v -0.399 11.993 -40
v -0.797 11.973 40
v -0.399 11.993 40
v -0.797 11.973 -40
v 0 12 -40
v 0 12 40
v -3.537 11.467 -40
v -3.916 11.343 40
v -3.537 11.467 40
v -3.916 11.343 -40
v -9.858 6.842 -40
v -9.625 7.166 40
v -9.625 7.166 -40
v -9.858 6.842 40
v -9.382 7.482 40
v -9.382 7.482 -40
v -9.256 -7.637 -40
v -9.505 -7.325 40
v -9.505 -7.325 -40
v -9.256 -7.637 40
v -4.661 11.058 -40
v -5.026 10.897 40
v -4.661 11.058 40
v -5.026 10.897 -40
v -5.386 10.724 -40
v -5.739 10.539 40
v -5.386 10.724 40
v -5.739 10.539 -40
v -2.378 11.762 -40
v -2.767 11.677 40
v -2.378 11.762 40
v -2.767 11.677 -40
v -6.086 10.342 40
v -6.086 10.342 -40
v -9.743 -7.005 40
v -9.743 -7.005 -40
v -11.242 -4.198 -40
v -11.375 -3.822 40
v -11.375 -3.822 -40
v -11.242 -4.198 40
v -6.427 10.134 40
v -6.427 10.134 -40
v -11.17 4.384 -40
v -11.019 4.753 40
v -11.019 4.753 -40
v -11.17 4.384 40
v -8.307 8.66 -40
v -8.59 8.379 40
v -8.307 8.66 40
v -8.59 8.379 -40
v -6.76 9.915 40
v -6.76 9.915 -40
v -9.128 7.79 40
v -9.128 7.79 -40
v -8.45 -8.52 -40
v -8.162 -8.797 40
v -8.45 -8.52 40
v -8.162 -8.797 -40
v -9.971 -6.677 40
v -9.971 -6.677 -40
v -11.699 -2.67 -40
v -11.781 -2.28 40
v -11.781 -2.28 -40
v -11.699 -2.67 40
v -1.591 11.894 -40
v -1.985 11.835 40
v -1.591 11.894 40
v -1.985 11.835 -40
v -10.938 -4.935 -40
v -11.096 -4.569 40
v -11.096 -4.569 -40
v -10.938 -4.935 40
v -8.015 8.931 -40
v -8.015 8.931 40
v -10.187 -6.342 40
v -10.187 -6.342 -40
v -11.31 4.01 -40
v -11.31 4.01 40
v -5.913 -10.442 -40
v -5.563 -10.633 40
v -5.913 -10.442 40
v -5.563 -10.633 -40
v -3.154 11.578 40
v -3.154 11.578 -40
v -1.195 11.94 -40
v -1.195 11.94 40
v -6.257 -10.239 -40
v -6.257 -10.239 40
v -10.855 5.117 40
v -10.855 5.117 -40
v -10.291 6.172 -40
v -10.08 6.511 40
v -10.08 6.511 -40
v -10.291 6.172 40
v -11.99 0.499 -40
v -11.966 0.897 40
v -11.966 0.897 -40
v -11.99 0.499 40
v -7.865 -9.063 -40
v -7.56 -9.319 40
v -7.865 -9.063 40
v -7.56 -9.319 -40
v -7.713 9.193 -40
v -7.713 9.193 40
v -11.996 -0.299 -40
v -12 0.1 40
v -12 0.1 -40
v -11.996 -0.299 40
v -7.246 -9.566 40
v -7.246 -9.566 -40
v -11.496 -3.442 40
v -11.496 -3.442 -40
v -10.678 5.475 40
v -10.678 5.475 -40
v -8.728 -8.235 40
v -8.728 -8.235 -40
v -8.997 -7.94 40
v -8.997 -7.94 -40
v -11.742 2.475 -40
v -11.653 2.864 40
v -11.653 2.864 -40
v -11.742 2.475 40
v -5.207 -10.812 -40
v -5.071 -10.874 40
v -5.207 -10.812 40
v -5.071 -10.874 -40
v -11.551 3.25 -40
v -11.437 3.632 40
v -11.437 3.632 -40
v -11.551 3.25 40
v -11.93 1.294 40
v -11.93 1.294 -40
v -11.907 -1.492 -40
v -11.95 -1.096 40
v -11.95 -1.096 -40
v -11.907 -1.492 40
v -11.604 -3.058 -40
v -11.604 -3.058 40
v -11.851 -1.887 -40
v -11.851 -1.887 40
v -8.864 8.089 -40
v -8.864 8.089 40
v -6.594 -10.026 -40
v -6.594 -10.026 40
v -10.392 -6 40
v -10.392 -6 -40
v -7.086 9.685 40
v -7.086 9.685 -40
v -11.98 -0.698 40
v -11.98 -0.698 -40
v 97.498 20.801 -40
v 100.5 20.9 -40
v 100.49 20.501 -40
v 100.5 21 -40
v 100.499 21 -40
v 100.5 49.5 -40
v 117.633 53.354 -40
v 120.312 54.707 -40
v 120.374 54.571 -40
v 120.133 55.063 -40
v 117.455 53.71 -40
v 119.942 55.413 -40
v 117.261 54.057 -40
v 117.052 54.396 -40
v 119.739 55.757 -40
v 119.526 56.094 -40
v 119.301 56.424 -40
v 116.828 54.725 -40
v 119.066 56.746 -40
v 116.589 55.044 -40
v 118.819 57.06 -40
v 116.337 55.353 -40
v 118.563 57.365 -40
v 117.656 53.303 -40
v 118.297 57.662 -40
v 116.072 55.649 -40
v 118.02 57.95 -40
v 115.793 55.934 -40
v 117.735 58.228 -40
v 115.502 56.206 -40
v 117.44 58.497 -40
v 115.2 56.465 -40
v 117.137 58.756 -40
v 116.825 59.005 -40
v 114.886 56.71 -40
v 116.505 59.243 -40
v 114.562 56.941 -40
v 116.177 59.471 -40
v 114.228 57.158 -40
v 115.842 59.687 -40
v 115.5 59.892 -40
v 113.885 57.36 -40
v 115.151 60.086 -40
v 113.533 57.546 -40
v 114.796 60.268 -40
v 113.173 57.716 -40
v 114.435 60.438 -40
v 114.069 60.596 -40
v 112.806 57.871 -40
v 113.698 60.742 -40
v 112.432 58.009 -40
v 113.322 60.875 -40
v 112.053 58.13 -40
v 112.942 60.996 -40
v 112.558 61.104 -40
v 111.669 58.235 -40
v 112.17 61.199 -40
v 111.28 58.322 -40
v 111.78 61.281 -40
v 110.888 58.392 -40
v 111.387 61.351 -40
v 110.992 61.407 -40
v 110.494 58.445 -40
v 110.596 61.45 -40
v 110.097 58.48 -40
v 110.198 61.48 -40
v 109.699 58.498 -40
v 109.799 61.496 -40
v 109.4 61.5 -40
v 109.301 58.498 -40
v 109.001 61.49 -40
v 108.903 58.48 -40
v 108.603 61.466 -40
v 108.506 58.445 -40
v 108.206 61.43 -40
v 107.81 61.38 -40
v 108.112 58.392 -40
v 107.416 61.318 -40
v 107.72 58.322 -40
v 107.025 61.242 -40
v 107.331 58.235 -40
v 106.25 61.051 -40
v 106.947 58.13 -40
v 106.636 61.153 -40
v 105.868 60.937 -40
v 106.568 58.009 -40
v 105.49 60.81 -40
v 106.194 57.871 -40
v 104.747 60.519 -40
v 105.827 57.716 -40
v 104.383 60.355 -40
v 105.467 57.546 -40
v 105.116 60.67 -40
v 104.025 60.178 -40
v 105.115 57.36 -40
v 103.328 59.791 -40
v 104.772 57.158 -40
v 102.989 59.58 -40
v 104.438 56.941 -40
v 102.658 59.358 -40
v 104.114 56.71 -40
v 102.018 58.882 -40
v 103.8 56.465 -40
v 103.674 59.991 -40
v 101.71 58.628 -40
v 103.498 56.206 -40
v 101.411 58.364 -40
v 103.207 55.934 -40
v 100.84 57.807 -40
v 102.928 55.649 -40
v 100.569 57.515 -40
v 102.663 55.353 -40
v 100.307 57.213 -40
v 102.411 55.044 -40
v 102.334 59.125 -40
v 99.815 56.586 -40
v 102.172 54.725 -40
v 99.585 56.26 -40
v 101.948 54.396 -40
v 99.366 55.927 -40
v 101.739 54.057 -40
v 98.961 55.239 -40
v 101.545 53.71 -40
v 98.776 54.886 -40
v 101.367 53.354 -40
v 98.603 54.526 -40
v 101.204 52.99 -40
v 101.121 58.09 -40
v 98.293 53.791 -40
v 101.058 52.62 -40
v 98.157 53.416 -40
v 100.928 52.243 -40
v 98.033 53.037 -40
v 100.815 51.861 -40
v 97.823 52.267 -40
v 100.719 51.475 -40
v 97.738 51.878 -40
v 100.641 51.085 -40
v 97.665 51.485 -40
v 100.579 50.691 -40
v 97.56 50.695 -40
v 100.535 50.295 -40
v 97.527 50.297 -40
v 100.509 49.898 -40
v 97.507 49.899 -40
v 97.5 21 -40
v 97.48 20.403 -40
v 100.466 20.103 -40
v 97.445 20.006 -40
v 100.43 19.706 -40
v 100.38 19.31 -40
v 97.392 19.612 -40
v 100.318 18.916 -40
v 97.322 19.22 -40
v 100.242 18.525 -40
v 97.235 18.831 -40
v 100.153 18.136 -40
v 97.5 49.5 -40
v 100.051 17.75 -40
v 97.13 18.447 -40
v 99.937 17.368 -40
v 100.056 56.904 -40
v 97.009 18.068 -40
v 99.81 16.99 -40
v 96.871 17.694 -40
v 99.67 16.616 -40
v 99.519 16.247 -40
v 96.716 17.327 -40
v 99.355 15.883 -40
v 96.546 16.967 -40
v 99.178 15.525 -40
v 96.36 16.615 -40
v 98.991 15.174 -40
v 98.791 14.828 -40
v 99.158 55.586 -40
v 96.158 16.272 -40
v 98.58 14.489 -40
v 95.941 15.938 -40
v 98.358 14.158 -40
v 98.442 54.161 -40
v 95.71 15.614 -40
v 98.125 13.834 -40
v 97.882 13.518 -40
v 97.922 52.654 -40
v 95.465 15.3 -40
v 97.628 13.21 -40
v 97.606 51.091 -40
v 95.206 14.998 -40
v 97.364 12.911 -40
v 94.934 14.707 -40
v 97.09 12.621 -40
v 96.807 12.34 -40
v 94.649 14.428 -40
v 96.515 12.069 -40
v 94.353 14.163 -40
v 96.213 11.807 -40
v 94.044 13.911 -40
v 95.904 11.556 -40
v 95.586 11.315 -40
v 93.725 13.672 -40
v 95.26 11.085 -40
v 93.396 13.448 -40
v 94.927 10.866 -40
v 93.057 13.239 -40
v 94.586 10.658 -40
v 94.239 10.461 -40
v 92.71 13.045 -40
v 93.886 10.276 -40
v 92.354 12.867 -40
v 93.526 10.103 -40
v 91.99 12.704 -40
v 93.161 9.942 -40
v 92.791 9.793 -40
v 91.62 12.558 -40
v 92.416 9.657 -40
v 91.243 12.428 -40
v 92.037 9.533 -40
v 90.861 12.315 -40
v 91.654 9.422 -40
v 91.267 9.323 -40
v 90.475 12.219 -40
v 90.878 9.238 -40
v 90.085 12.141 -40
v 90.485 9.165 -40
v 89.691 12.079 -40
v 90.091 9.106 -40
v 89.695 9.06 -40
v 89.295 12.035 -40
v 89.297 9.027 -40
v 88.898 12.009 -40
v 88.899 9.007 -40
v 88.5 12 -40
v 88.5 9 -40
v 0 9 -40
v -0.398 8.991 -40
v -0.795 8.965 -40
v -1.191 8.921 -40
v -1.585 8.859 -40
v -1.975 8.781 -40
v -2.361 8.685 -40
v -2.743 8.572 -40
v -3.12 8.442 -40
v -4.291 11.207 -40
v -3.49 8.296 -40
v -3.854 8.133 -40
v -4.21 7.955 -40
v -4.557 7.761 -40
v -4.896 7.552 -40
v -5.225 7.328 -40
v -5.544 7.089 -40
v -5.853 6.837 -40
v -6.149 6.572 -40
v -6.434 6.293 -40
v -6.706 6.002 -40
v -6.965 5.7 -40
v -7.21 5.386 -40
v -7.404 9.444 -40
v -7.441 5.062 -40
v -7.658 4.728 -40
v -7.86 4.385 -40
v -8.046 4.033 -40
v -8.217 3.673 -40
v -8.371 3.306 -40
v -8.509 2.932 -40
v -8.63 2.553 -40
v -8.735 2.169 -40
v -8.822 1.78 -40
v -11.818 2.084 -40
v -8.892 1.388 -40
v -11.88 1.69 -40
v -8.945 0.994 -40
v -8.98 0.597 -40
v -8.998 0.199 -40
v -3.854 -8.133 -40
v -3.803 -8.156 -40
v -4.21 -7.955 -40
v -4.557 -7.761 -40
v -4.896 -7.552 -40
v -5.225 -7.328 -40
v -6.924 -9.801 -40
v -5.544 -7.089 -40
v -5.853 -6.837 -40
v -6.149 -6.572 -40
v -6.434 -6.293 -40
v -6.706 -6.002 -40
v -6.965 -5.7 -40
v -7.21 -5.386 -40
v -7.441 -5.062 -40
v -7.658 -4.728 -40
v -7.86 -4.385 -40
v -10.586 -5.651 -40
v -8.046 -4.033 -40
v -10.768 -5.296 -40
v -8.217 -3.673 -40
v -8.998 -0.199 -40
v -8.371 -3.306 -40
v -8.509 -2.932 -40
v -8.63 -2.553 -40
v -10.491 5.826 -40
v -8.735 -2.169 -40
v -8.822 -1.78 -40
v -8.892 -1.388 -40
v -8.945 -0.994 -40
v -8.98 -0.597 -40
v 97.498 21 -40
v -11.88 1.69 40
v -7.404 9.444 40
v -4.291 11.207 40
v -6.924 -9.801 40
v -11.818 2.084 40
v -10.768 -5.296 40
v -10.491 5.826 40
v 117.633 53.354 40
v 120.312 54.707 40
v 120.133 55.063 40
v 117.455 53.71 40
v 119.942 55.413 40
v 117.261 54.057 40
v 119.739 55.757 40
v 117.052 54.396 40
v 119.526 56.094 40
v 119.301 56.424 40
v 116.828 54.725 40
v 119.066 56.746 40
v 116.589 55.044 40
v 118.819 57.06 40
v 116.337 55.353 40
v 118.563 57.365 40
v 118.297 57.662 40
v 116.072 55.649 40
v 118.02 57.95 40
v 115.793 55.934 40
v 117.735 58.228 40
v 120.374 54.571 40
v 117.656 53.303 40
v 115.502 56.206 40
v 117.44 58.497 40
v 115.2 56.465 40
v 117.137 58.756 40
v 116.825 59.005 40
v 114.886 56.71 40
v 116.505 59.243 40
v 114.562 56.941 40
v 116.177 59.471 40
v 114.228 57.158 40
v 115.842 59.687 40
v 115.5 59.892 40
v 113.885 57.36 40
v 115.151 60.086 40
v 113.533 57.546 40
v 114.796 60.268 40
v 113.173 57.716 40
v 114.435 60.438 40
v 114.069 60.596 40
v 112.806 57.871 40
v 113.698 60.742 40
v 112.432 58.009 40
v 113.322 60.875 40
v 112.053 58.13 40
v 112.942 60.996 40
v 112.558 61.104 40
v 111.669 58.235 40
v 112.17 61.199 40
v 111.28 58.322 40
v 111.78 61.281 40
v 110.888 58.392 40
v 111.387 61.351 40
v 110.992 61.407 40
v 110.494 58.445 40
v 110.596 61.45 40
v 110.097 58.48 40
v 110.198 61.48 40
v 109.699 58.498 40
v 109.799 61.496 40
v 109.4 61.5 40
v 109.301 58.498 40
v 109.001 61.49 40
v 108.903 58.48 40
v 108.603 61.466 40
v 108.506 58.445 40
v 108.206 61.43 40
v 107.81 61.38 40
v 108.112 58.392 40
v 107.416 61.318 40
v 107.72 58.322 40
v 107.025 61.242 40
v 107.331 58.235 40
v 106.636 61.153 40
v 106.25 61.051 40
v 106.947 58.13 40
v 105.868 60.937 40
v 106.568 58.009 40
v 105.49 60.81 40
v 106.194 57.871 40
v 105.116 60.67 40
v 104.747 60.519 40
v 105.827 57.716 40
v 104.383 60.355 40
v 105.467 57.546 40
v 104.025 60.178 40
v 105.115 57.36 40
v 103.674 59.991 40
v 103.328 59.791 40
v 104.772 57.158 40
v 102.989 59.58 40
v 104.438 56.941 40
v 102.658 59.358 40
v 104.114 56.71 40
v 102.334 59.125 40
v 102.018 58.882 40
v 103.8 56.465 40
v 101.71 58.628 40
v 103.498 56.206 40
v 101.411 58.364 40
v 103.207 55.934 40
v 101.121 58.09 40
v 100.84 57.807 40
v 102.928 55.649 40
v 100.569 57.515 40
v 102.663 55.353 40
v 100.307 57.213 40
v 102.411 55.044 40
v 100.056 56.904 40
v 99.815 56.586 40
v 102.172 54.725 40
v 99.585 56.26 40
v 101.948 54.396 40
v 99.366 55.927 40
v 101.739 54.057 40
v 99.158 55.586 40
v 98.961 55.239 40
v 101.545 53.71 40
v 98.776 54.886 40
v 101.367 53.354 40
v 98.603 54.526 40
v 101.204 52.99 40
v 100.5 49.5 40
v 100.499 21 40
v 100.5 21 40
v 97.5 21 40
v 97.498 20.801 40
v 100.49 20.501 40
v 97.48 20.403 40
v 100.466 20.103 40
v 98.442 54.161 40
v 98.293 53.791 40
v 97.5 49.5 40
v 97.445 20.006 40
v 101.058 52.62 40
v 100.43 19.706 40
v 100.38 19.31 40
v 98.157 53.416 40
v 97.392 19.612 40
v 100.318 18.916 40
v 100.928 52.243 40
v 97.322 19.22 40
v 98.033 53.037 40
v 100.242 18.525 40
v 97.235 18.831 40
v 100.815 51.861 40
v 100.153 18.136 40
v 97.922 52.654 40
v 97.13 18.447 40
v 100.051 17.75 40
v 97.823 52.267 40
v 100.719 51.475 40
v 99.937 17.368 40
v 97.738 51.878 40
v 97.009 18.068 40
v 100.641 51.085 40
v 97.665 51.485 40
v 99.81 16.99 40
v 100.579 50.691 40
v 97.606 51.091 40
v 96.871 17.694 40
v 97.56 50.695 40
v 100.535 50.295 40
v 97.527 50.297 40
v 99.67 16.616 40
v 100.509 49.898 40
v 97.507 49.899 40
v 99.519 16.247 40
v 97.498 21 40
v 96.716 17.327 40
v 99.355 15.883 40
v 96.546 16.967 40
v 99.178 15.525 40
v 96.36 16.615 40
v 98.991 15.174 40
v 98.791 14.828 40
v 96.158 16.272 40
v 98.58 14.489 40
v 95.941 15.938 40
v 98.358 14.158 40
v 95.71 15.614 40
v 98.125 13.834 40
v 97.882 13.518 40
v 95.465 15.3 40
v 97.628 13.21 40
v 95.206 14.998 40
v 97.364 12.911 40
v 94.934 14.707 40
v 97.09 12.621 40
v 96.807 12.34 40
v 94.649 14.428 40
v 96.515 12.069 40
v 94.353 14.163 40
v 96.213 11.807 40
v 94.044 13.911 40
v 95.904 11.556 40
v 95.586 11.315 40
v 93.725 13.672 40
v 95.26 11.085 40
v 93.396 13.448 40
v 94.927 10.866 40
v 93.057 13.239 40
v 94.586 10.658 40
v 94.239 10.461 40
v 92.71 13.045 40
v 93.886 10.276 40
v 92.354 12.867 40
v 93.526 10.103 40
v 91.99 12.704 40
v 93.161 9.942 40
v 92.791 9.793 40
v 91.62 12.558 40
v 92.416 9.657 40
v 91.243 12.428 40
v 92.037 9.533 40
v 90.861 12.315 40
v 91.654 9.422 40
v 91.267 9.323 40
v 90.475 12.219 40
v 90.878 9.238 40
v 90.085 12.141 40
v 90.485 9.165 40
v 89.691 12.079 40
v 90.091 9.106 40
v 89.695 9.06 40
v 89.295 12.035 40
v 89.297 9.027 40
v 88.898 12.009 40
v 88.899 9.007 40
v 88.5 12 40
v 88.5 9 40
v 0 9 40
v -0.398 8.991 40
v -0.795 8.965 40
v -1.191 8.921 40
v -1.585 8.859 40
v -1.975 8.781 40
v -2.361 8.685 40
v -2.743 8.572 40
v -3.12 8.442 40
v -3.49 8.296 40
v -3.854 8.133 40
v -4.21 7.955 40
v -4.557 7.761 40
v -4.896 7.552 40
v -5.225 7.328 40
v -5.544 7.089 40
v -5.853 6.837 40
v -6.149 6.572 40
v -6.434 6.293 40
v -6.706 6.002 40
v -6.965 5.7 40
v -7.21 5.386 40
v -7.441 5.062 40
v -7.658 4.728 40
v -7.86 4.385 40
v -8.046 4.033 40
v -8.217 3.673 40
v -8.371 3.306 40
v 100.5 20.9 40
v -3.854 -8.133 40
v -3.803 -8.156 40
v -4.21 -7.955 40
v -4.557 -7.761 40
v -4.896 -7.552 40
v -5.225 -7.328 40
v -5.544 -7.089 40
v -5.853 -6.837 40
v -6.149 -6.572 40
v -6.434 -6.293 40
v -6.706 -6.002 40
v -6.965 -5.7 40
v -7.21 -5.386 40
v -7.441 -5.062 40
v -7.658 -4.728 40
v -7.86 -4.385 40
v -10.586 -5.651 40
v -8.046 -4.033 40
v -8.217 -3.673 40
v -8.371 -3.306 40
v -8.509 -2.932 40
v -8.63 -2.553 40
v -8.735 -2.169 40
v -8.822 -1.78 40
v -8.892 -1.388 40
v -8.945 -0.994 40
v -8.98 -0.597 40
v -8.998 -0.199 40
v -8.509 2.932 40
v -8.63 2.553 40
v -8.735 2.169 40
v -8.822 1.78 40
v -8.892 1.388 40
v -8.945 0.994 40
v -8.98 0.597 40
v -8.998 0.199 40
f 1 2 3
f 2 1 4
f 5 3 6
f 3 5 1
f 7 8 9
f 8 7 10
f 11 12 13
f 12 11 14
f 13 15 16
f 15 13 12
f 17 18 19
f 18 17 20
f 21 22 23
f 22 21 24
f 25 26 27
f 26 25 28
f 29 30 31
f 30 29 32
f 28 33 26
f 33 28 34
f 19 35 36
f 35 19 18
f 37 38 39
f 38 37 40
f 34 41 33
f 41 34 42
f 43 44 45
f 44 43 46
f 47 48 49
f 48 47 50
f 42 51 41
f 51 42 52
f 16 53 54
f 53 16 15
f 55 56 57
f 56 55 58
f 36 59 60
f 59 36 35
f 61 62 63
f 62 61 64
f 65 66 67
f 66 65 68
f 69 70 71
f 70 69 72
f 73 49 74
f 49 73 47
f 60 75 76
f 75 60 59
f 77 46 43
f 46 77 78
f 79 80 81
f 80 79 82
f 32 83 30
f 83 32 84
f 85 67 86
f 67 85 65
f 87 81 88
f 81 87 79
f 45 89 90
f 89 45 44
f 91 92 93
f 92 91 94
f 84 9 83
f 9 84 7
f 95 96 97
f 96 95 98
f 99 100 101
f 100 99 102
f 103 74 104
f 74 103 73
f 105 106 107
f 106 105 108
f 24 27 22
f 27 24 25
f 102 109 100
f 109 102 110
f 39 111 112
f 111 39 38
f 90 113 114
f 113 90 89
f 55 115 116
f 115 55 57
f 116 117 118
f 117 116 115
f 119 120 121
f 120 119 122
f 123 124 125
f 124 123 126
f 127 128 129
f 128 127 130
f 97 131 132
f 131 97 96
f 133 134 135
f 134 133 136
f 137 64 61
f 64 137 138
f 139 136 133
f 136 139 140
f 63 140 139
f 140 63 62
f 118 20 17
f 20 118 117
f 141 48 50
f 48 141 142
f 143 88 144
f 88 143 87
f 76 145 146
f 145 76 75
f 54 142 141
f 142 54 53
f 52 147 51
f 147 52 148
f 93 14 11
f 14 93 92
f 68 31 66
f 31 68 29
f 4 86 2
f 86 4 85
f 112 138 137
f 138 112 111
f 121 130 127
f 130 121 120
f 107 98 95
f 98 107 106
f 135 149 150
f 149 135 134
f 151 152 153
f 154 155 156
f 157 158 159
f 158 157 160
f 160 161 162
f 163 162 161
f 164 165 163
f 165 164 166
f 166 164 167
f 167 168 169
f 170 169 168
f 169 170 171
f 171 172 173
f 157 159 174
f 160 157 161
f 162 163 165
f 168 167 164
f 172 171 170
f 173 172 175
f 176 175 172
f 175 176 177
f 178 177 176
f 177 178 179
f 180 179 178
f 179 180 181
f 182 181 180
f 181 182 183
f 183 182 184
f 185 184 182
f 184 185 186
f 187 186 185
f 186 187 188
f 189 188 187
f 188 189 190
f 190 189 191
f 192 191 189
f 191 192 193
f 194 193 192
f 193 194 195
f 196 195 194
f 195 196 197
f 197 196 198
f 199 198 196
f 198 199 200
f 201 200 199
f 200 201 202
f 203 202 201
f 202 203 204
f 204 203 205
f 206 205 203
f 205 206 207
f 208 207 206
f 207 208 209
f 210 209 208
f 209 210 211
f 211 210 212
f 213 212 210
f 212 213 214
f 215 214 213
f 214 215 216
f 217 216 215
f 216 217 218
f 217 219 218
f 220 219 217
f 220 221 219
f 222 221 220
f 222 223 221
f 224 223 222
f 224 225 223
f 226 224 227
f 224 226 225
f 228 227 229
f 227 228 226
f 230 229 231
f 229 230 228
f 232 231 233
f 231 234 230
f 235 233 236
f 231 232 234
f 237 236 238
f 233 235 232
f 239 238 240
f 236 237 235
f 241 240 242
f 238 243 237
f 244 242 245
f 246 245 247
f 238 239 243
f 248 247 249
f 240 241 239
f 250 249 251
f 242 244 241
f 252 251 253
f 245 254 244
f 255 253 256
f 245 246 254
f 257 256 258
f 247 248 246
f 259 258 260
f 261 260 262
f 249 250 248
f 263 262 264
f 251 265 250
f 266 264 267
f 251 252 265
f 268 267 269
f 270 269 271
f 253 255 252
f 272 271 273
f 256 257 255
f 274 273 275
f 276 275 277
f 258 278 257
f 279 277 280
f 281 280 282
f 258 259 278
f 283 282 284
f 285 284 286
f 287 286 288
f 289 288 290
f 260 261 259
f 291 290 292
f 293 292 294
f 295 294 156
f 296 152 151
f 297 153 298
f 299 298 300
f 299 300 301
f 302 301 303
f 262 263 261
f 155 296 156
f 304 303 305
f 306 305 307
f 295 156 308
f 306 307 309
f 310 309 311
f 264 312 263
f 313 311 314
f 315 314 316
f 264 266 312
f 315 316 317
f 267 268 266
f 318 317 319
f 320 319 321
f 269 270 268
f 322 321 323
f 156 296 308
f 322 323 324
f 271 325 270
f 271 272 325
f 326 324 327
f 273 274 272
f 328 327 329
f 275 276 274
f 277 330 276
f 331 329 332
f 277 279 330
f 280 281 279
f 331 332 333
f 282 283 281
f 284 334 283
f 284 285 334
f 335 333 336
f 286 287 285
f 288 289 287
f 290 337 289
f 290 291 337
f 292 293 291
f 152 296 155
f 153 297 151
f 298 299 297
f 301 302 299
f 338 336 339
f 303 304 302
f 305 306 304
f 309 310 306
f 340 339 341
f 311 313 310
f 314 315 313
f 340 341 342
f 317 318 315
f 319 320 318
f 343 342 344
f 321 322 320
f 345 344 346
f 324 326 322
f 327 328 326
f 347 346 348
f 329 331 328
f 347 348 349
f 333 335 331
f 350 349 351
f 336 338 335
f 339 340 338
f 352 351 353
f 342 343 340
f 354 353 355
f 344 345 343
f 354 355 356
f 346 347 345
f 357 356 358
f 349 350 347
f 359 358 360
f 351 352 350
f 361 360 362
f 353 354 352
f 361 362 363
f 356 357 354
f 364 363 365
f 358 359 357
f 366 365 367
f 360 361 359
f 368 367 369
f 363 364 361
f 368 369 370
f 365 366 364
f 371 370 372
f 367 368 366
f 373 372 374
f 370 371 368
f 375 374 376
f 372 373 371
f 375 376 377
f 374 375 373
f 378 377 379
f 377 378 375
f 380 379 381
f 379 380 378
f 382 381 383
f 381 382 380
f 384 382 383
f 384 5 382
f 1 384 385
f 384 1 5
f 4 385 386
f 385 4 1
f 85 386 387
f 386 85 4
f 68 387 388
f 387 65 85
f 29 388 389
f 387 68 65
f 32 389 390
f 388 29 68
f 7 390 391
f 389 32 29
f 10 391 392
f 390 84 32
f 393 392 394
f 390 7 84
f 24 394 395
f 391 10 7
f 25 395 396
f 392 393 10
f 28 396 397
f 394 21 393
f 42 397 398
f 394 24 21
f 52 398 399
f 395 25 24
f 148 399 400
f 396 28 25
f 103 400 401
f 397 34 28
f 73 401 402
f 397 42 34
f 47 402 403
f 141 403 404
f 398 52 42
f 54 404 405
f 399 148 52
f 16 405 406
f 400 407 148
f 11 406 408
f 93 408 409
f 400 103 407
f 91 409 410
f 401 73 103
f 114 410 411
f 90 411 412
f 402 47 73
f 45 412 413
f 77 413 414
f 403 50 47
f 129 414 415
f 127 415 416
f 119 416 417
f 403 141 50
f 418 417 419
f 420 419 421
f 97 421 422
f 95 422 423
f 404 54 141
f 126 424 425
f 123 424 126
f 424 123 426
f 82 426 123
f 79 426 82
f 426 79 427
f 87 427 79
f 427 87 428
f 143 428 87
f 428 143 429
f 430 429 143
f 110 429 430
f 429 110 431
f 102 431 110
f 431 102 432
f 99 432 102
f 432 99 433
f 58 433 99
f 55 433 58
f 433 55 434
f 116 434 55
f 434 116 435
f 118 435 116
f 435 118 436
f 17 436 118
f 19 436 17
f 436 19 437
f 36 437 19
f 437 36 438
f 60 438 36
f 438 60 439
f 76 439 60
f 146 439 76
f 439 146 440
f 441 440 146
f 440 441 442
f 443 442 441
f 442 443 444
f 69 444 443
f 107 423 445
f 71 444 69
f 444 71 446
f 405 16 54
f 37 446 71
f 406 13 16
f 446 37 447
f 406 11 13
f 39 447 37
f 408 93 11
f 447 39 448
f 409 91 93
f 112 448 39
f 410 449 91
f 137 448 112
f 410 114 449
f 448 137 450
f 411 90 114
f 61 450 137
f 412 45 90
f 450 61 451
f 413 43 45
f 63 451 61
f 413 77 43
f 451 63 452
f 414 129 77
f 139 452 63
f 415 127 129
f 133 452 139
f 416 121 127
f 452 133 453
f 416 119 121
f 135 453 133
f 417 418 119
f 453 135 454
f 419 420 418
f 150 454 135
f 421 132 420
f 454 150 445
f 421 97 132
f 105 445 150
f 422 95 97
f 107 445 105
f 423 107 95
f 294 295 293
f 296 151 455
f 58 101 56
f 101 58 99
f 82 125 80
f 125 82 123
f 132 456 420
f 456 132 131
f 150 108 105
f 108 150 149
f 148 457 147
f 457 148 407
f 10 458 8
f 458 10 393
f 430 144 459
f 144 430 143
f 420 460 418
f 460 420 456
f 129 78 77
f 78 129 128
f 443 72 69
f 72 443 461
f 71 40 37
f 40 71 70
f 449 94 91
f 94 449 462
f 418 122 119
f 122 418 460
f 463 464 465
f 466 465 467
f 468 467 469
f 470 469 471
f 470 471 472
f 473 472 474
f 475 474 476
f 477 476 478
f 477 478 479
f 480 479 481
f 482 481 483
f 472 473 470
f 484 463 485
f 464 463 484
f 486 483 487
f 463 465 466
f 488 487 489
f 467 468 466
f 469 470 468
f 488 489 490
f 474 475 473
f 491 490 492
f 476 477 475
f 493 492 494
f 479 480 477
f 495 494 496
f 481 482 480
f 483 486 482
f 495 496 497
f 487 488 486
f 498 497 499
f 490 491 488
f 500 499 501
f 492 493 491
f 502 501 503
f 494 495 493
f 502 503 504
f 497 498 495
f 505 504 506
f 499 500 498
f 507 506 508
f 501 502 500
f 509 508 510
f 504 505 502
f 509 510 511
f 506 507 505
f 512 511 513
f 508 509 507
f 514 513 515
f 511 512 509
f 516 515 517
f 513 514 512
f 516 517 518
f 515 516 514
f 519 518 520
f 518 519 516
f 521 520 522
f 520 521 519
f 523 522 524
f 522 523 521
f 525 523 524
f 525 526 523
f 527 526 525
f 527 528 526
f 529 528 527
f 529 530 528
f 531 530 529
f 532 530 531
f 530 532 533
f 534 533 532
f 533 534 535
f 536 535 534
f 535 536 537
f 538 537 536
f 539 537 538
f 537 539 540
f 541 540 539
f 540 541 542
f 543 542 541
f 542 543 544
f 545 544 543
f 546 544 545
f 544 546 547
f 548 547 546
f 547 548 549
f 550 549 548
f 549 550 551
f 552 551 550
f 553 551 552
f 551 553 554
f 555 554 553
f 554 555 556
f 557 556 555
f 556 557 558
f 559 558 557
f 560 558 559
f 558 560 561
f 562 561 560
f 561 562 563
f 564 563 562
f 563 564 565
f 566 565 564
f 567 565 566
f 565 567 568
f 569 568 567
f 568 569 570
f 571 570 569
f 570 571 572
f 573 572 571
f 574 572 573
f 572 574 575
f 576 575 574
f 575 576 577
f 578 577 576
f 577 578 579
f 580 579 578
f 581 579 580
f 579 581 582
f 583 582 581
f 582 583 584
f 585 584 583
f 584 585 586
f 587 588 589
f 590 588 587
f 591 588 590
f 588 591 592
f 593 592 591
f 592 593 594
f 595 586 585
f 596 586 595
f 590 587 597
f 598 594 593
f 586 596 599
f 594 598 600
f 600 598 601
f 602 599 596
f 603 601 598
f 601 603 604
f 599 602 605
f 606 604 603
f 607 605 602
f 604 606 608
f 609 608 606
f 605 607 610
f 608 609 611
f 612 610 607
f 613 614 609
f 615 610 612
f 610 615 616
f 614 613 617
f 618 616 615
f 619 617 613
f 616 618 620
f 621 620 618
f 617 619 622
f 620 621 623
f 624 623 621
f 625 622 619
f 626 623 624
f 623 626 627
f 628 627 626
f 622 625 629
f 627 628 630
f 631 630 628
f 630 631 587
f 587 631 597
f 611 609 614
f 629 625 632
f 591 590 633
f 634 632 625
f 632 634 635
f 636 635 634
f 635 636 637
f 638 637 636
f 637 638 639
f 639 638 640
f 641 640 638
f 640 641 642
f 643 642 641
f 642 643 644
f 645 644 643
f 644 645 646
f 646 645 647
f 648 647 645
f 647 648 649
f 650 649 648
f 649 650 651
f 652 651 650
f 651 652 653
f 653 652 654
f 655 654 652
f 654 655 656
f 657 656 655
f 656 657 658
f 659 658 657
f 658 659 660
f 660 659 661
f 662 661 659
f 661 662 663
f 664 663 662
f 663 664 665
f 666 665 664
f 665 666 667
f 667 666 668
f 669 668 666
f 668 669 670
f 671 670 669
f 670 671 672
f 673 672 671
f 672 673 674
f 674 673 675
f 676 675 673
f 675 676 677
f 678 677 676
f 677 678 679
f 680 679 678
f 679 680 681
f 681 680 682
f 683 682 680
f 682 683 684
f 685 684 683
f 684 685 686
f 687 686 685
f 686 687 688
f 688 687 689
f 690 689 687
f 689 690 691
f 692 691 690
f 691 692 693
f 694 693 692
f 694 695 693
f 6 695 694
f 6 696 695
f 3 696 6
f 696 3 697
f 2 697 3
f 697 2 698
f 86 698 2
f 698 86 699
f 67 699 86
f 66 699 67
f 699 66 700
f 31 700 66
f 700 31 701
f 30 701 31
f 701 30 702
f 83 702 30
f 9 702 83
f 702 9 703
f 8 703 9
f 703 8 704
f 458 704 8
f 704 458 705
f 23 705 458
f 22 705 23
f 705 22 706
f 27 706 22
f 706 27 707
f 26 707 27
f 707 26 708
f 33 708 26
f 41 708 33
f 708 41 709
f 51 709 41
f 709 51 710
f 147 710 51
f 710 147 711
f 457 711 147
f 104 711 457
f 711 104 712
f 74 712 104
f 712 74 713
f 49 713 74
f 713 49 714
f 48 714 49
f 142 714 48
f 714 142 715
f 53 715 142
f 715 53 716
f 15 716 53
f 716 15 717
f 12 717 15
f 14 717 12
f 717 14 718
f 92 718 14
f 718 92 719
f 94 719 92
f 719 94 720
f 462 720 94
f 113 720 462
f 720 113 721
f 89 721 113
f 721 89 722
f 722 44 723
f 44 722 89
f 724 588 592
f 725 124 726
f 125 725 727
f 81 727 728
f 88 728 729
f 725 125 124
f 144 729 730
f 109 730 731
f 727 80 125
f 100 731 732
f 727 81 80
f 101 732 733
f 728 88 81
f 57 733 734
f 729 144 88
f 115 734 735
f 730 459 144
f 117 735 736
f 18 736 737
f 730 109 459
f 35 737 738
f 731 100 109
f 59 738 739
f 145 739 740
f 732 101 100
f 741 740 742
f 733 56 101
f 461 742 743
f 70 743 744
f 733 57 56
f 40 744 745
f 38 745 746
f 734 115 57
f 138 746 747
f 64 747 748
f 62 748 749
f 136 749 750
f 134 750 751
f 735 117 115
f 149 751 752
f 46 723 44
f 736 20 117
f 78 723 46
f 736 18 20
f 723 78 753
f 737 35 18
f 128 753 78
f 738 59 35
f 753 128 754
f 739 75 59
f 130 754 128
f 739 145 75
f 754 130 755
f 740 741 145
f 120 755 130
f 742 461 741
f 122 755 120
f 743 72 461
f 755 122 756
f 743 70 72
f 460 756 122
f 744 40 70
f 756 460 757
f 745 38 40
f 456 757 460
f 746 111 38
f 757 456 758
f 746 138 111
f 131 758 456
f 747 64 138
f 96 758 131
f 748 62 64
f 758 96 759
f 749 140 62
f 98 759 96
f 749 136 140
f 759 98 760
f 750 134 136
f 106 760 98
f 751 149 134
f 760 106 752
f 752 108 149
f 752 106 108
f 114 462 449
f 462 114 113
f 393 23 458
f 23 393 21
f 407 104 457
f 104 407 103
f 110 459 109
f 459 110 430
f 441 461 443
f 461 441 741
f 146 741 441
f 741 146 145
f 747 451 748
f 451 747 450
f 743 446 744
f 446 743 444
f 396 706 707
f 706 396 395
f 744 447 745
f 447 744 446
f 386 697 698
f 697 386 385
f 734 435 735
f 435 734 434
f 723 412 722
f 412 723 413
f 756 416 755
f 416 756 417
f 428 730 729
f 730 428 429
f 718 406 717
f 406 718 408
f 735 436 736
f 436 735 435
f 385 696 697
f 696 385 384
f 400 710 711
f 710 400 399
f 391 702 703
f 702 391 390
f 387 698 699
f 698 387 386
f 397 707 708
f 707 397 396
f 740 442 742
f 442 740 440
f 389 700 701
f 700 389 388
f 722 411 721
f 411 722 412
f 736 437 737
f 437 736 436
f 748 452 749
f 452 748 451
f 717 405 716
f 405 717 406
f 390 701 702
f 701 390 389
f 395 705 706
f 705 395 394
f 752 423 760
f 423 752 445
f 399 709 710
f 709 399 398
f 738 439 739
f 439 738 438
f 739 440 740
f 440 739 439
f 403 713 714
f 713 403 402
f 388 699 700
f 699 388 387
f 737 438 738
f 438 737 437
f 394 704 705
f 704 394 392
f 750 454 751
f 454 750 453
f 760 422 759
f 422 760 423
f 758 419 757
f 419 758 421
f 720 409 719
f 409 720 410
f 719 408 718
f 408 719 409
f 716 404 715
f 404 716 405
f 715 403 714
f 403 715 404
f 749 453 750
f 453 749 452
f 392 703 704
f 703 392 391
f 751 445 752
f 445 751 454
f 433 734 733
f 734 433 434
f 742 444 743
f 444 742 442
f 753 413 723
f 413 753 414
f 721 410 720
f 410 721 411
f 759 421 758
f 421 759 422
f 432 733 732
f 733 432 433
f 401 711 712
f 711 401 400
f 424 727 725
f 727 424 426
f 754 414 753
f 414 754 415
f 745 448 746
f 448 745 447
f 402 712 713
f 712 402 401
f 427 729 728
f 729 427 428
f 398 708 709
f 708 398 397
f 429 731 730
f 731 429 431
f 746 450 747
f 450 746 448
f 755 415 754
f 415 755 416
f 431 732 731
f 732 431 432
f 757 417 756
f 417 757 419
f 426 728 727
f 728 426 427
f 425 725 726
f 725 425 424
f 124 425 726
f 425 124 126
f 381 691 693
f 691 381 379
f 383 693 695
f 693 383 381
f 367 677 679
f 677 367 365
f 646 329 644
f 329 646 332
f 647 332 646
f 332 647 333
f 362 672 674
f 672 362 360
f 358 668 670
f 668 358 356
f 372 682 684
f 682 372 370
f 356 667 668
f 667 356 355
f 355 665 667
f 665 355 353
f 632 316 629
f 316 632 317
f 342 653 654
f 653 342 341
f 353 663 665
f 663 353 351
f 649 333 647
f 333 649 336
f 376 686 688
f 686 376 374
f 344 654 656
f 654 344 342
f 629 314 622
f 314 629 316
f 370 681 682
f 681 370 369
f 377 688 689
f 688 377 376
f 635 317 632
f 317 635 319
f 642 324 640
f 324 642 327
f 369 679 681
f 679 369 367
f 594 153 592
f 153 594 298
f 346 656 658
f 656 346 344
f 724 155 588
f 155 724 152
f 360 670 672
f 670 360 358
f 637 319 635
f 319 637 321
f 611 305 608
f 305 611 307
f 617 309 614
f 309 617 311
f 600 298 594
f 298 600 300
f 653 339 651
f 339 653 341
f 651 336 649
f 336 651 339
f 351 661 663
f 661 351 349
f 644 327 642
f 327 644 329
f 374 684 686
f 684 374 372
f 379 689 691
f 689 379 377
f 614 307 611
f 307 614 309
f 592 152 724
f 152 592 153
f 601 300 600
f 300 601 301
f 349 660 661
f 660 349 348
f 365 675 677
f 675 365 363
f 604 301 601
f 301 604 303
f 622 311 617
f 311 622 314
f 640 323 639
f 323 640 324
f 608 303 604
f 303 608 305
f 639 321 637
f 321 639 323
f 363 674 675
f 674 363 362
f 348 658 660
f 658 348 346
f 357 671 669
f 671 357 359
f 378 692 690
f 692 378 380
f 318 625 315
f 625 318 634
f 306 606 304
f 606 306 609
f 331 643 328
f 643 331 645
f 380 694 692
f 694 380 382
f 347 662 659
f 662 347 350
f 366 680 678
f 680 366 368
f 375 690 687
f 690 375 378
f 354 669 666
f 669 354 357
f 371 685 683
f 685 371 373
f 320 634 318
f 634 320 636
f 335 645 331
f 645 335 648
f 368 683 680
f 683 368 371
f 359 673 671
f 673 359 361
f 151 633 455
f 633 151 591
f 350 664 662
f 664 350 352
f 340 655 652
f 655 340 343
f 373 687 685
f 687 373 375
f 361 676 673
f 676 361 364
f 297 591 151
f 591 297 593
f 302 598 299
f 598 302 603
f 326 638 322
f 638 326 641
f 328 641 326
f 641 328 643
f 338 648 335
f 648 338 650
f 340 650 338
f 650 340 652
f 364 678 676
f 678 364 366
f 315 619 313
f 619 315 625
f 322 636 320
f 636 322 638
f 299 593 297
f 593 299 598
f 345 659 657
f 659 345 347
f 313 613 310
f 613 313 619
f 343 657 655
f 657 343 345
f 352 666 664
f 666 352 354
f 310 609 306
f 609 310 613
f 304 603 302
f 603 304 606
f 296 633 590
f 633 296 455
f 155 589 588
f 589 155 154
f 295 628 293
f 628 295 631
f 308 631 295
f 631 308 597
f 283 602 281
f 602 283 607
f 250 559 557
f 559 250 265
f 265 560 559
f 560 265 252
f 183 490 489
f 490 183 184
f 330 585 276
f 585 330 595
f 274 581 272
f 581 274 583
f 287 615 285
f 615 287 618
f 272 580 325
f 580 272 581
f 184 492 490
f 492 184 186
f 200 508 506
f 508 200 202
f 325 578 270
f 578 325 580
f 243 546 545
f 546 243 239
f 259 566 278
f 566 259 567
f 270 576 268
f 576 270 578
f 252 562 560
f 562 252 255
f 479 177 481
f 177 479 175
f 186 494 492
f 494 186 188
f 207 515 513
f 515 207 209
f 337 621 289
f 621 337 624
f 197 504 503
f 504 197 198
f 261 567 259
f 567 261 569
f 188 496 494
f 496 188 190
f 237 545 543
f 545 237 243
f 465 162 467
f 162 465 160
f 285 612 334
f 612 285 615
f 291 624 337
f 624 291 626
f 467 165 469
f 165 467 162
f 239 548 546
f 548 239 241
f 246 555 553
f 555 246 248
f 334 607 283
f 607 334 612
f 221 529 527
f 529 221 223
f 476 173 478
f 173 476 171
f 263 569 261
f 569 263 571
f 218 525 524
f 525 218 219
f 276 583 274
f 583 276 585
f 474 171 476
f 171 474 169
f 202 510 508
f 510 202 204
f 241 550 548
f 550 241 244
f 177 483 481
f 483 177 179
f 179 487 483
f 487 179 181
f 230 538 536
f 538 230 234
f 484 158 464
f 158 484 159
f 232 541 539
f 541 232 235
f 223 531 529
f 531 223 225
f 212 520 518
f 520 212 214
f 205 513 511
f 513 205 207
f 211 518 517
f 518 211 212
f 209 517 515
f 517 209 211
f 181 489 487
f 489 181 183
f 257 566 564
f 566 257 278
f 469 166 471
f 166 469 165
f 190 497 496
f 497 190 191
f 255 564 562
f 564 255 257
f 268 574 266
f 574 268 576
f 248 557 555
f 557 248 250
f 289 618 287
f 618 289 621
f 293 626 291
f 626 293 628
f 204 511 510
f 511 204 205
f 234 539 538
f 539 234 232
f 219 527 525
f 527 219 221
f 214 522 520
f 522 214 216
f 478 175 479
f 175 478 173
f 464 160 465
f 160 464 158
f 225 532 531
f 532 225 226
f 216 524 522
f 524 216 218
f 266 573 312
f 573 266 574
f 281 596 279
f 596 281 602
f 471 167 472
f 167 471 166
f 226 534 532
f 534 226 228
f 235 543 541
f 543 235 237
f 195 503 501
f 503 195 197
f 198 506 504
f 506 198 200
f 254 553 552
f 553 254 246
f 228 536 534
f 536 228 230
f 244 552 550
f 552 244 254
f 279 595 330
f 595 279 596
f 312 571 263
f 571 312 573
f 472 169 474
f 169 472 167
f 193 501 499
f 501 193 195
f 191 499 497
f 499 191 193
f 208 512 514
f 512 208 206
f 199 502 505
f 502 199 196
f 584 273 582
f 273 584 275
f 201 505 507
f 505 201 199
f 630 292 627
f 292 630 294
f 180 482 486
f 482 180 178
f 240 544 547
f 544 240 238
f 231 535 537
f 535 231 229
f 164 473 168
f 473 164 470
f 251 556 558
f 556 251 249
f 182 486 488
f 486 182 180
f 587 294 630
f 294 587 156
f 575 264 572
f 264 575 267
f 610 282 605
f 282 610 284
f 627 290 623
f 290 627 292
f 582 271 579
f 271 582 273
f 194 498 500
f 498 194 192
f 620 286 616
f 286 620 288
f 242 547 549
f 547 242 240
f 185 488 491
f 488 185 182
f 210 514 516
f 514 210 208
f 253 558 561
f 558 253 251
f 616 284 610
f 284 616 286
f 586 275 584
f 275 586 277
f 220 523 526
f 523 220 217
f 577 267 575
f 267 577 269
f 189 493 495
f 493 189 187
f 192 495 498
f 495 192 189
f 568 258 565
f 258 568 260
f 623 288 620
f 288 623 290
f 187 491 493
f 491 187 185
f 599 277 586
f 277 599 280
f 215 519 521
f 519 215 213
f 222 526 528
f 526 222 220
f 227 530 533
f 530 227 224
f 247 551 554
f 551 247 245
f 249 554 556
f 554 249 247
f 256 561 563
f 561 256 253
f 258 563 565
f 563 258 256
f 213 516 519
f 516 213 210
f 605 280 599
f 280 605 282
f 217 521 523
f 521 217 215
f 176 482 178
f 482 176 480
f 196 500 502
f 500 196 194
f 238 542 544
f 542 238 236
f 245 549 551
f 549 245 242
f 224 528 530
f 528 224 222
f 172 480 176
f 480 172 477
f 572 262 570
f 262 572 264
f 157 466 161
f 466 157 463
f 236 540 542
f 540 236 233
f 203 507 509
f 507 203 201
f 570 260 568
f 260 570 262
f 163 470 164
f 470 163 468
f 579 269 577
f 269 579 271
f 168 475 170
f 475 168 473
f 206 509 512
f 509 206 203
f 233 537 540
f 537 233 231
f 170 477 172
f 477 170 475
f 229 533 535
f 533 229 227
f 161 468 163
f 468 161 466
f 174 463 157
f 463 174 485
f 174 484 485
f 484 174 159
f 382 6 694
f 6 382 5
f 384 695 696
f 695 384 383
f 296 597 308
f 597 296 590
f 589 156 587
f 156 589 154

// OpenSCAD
// file: packages/cutting_wedge.scad
// Library: cutting_wedge.scad
// Version: 1.0.0
// Author: David Bowers
// Copyright: 2022
// License: 2-clause BSD License (http://opensource.org/licenses/BSD-2-Clause)

// Will produce a wedge to be used with difference();
// cutting_wedge(angle:int, outside:int, height:int); 


module cutting_wedge(angle=90, outside=21, height=110){
    cutters = [outside*2,outside,height+0.5];
    echo (angle);
    difference(){
        cylinder(h=height,d=outside,center=true);
        rotate([0,0,angle])
        translate([outside,outside/2,-0.1])
        cube(cutters,center=true);
        translate([0,-outside/2,-0.1])
        cube(cutters,center=true);
    }
}

cutting_wedge();
// file: packages/tube.scad
// Library: tube.scad
// Version: 1.0.0
// Author: David Bowers
// Copyright: 2022
// License: 2-clause BSD License (http://opensource.org/licenses/BSD-2-Clause)

// tube(outside:int, inside:int, height:int); 


module tube(outside, inside, height){
    difference(){
        cylinder(h=height,d=outside,center=true);
        cylinder(h=height+0.1,d=inside, center=true);
    }
}
// file: packages/plate.scad
// Library: plate.scad
// Version: 1.0.0
// Author: David Bowers
// Copyright: 2022
// License: 2-clause BSD License (http://opensource.org/licenses/BSD-2-Clause)


// Will produce a plate that is centered on x axis and
// aligned with y axis. 
//
// plate(length:int, thickness:int, width:int); 



module plate(length=100, thickness=3, width=100) {
    
    pllocation = [length/2,0,0];
    plsize = [length, thickness, width];
    // blockout sizes
    bonumber = 4;
    bowidth = width/(bonumber*2+1);
    bolength = length - bowidth*2;
    
    translate(pllocation)
            cube(plsize,center=true);
}
// file: packages/cup.scad
// Library: cup.scad
// Version: 1.0.0
// Author: David Bowers
// Copyright: 2022
// License: 2-clause BSD License (http://opensource.org/licenses/BSD-2-Clause)

// cup(angle:int, inside:int, thickness:int, height:int); 
//   Made to export a 3D printable stl file from.abs

// EXAMPLE USAGE:
// cup(
//    angle:int
//        The angle to which the arc will extend. 
//    inside:int
//        The diameter of the inside circle. 
//    thickness:int 
//        The thickness of the arc. 
//    height:int
//        The height of the cup. 
//  );
//   

use <./tube.scad>;
use <./cutting_wedge.scad>;
 

module cup(angle=90, inside=15, thickness=3, height=110) {
    // a cup is an arc line with thickness. 
    outside=inside+thickness*2;
    intersection(){
        tube(outside, inside, height);
        cutting_wedge(angle, outside, height);
    }
}

cup();
// main file
// Library: phone_prop.scad
// Version: 1.0.0
// Author: David Bowers
// Copyright: 2022
// License: 2-clause BSD License (http://opensource.org/licenses/BSD-2-Clause)

// phone_prop(); 
//   Made to export a 3D printable stl file from.abs

// EXAMPLE USAGE:
// PhoneProp();
//   export stl file and import it into your printer software. 


// Comment out these two lines if rendering is to slow.
$fa = 1.0;
$fs = 0.4;

// The piece is two cubes held together by
// three tubes (hollow cynlinders)

use <./packages/cup.scad>;
use <./packages/plate.scad>;


// Dimensions:
inside = 18;      // Thickness of phone
thickness = 3;    // Thickness of piece 
length = 120;     // Length of long side
width = 80; 


module phone_prop(length, thickness, width, obthickness) {
    //translate();
    height = length/2;
    // point reference    
    clr = obthickness/2 + thickness/2;
    clr3 = 3*clr;
    clr2 = 2*clr;
    pl1len = length - clr3;
    pl2len = height - clr3;
    angles = [155, 90];
    points = [
        [0,0,0],
        [0,clr,0],
        [pl1len,clr2,0],
        [pl1len+clr,clr2,0],
        [pl1len+clr,clr2+pl2len,0],
        [pl1len+clr2,clr2+pl2len,0]
        ];
    rots = [
        [0,0,90],
        [0,0,270],
        [0,180,0]
        ];
        
    rotate(rots[0])
        cup(angles[0],obthickness, thickness, width);
    translate(points[1])
        plate(pl1len, thickness, width);
    translate(points[2])
        rotate(rots[1])
            cup(angles[1],obthickness, thickness, width);
    translate(points[3])
        rotate(rots[0])
            plate(pl2len, thickness, width);
    translate(points[5])
        rotate(rots[2])
            cup(angles[0],obthickness, thickness, width);
            
}


phone_prop(length, thickness, width, inside);
